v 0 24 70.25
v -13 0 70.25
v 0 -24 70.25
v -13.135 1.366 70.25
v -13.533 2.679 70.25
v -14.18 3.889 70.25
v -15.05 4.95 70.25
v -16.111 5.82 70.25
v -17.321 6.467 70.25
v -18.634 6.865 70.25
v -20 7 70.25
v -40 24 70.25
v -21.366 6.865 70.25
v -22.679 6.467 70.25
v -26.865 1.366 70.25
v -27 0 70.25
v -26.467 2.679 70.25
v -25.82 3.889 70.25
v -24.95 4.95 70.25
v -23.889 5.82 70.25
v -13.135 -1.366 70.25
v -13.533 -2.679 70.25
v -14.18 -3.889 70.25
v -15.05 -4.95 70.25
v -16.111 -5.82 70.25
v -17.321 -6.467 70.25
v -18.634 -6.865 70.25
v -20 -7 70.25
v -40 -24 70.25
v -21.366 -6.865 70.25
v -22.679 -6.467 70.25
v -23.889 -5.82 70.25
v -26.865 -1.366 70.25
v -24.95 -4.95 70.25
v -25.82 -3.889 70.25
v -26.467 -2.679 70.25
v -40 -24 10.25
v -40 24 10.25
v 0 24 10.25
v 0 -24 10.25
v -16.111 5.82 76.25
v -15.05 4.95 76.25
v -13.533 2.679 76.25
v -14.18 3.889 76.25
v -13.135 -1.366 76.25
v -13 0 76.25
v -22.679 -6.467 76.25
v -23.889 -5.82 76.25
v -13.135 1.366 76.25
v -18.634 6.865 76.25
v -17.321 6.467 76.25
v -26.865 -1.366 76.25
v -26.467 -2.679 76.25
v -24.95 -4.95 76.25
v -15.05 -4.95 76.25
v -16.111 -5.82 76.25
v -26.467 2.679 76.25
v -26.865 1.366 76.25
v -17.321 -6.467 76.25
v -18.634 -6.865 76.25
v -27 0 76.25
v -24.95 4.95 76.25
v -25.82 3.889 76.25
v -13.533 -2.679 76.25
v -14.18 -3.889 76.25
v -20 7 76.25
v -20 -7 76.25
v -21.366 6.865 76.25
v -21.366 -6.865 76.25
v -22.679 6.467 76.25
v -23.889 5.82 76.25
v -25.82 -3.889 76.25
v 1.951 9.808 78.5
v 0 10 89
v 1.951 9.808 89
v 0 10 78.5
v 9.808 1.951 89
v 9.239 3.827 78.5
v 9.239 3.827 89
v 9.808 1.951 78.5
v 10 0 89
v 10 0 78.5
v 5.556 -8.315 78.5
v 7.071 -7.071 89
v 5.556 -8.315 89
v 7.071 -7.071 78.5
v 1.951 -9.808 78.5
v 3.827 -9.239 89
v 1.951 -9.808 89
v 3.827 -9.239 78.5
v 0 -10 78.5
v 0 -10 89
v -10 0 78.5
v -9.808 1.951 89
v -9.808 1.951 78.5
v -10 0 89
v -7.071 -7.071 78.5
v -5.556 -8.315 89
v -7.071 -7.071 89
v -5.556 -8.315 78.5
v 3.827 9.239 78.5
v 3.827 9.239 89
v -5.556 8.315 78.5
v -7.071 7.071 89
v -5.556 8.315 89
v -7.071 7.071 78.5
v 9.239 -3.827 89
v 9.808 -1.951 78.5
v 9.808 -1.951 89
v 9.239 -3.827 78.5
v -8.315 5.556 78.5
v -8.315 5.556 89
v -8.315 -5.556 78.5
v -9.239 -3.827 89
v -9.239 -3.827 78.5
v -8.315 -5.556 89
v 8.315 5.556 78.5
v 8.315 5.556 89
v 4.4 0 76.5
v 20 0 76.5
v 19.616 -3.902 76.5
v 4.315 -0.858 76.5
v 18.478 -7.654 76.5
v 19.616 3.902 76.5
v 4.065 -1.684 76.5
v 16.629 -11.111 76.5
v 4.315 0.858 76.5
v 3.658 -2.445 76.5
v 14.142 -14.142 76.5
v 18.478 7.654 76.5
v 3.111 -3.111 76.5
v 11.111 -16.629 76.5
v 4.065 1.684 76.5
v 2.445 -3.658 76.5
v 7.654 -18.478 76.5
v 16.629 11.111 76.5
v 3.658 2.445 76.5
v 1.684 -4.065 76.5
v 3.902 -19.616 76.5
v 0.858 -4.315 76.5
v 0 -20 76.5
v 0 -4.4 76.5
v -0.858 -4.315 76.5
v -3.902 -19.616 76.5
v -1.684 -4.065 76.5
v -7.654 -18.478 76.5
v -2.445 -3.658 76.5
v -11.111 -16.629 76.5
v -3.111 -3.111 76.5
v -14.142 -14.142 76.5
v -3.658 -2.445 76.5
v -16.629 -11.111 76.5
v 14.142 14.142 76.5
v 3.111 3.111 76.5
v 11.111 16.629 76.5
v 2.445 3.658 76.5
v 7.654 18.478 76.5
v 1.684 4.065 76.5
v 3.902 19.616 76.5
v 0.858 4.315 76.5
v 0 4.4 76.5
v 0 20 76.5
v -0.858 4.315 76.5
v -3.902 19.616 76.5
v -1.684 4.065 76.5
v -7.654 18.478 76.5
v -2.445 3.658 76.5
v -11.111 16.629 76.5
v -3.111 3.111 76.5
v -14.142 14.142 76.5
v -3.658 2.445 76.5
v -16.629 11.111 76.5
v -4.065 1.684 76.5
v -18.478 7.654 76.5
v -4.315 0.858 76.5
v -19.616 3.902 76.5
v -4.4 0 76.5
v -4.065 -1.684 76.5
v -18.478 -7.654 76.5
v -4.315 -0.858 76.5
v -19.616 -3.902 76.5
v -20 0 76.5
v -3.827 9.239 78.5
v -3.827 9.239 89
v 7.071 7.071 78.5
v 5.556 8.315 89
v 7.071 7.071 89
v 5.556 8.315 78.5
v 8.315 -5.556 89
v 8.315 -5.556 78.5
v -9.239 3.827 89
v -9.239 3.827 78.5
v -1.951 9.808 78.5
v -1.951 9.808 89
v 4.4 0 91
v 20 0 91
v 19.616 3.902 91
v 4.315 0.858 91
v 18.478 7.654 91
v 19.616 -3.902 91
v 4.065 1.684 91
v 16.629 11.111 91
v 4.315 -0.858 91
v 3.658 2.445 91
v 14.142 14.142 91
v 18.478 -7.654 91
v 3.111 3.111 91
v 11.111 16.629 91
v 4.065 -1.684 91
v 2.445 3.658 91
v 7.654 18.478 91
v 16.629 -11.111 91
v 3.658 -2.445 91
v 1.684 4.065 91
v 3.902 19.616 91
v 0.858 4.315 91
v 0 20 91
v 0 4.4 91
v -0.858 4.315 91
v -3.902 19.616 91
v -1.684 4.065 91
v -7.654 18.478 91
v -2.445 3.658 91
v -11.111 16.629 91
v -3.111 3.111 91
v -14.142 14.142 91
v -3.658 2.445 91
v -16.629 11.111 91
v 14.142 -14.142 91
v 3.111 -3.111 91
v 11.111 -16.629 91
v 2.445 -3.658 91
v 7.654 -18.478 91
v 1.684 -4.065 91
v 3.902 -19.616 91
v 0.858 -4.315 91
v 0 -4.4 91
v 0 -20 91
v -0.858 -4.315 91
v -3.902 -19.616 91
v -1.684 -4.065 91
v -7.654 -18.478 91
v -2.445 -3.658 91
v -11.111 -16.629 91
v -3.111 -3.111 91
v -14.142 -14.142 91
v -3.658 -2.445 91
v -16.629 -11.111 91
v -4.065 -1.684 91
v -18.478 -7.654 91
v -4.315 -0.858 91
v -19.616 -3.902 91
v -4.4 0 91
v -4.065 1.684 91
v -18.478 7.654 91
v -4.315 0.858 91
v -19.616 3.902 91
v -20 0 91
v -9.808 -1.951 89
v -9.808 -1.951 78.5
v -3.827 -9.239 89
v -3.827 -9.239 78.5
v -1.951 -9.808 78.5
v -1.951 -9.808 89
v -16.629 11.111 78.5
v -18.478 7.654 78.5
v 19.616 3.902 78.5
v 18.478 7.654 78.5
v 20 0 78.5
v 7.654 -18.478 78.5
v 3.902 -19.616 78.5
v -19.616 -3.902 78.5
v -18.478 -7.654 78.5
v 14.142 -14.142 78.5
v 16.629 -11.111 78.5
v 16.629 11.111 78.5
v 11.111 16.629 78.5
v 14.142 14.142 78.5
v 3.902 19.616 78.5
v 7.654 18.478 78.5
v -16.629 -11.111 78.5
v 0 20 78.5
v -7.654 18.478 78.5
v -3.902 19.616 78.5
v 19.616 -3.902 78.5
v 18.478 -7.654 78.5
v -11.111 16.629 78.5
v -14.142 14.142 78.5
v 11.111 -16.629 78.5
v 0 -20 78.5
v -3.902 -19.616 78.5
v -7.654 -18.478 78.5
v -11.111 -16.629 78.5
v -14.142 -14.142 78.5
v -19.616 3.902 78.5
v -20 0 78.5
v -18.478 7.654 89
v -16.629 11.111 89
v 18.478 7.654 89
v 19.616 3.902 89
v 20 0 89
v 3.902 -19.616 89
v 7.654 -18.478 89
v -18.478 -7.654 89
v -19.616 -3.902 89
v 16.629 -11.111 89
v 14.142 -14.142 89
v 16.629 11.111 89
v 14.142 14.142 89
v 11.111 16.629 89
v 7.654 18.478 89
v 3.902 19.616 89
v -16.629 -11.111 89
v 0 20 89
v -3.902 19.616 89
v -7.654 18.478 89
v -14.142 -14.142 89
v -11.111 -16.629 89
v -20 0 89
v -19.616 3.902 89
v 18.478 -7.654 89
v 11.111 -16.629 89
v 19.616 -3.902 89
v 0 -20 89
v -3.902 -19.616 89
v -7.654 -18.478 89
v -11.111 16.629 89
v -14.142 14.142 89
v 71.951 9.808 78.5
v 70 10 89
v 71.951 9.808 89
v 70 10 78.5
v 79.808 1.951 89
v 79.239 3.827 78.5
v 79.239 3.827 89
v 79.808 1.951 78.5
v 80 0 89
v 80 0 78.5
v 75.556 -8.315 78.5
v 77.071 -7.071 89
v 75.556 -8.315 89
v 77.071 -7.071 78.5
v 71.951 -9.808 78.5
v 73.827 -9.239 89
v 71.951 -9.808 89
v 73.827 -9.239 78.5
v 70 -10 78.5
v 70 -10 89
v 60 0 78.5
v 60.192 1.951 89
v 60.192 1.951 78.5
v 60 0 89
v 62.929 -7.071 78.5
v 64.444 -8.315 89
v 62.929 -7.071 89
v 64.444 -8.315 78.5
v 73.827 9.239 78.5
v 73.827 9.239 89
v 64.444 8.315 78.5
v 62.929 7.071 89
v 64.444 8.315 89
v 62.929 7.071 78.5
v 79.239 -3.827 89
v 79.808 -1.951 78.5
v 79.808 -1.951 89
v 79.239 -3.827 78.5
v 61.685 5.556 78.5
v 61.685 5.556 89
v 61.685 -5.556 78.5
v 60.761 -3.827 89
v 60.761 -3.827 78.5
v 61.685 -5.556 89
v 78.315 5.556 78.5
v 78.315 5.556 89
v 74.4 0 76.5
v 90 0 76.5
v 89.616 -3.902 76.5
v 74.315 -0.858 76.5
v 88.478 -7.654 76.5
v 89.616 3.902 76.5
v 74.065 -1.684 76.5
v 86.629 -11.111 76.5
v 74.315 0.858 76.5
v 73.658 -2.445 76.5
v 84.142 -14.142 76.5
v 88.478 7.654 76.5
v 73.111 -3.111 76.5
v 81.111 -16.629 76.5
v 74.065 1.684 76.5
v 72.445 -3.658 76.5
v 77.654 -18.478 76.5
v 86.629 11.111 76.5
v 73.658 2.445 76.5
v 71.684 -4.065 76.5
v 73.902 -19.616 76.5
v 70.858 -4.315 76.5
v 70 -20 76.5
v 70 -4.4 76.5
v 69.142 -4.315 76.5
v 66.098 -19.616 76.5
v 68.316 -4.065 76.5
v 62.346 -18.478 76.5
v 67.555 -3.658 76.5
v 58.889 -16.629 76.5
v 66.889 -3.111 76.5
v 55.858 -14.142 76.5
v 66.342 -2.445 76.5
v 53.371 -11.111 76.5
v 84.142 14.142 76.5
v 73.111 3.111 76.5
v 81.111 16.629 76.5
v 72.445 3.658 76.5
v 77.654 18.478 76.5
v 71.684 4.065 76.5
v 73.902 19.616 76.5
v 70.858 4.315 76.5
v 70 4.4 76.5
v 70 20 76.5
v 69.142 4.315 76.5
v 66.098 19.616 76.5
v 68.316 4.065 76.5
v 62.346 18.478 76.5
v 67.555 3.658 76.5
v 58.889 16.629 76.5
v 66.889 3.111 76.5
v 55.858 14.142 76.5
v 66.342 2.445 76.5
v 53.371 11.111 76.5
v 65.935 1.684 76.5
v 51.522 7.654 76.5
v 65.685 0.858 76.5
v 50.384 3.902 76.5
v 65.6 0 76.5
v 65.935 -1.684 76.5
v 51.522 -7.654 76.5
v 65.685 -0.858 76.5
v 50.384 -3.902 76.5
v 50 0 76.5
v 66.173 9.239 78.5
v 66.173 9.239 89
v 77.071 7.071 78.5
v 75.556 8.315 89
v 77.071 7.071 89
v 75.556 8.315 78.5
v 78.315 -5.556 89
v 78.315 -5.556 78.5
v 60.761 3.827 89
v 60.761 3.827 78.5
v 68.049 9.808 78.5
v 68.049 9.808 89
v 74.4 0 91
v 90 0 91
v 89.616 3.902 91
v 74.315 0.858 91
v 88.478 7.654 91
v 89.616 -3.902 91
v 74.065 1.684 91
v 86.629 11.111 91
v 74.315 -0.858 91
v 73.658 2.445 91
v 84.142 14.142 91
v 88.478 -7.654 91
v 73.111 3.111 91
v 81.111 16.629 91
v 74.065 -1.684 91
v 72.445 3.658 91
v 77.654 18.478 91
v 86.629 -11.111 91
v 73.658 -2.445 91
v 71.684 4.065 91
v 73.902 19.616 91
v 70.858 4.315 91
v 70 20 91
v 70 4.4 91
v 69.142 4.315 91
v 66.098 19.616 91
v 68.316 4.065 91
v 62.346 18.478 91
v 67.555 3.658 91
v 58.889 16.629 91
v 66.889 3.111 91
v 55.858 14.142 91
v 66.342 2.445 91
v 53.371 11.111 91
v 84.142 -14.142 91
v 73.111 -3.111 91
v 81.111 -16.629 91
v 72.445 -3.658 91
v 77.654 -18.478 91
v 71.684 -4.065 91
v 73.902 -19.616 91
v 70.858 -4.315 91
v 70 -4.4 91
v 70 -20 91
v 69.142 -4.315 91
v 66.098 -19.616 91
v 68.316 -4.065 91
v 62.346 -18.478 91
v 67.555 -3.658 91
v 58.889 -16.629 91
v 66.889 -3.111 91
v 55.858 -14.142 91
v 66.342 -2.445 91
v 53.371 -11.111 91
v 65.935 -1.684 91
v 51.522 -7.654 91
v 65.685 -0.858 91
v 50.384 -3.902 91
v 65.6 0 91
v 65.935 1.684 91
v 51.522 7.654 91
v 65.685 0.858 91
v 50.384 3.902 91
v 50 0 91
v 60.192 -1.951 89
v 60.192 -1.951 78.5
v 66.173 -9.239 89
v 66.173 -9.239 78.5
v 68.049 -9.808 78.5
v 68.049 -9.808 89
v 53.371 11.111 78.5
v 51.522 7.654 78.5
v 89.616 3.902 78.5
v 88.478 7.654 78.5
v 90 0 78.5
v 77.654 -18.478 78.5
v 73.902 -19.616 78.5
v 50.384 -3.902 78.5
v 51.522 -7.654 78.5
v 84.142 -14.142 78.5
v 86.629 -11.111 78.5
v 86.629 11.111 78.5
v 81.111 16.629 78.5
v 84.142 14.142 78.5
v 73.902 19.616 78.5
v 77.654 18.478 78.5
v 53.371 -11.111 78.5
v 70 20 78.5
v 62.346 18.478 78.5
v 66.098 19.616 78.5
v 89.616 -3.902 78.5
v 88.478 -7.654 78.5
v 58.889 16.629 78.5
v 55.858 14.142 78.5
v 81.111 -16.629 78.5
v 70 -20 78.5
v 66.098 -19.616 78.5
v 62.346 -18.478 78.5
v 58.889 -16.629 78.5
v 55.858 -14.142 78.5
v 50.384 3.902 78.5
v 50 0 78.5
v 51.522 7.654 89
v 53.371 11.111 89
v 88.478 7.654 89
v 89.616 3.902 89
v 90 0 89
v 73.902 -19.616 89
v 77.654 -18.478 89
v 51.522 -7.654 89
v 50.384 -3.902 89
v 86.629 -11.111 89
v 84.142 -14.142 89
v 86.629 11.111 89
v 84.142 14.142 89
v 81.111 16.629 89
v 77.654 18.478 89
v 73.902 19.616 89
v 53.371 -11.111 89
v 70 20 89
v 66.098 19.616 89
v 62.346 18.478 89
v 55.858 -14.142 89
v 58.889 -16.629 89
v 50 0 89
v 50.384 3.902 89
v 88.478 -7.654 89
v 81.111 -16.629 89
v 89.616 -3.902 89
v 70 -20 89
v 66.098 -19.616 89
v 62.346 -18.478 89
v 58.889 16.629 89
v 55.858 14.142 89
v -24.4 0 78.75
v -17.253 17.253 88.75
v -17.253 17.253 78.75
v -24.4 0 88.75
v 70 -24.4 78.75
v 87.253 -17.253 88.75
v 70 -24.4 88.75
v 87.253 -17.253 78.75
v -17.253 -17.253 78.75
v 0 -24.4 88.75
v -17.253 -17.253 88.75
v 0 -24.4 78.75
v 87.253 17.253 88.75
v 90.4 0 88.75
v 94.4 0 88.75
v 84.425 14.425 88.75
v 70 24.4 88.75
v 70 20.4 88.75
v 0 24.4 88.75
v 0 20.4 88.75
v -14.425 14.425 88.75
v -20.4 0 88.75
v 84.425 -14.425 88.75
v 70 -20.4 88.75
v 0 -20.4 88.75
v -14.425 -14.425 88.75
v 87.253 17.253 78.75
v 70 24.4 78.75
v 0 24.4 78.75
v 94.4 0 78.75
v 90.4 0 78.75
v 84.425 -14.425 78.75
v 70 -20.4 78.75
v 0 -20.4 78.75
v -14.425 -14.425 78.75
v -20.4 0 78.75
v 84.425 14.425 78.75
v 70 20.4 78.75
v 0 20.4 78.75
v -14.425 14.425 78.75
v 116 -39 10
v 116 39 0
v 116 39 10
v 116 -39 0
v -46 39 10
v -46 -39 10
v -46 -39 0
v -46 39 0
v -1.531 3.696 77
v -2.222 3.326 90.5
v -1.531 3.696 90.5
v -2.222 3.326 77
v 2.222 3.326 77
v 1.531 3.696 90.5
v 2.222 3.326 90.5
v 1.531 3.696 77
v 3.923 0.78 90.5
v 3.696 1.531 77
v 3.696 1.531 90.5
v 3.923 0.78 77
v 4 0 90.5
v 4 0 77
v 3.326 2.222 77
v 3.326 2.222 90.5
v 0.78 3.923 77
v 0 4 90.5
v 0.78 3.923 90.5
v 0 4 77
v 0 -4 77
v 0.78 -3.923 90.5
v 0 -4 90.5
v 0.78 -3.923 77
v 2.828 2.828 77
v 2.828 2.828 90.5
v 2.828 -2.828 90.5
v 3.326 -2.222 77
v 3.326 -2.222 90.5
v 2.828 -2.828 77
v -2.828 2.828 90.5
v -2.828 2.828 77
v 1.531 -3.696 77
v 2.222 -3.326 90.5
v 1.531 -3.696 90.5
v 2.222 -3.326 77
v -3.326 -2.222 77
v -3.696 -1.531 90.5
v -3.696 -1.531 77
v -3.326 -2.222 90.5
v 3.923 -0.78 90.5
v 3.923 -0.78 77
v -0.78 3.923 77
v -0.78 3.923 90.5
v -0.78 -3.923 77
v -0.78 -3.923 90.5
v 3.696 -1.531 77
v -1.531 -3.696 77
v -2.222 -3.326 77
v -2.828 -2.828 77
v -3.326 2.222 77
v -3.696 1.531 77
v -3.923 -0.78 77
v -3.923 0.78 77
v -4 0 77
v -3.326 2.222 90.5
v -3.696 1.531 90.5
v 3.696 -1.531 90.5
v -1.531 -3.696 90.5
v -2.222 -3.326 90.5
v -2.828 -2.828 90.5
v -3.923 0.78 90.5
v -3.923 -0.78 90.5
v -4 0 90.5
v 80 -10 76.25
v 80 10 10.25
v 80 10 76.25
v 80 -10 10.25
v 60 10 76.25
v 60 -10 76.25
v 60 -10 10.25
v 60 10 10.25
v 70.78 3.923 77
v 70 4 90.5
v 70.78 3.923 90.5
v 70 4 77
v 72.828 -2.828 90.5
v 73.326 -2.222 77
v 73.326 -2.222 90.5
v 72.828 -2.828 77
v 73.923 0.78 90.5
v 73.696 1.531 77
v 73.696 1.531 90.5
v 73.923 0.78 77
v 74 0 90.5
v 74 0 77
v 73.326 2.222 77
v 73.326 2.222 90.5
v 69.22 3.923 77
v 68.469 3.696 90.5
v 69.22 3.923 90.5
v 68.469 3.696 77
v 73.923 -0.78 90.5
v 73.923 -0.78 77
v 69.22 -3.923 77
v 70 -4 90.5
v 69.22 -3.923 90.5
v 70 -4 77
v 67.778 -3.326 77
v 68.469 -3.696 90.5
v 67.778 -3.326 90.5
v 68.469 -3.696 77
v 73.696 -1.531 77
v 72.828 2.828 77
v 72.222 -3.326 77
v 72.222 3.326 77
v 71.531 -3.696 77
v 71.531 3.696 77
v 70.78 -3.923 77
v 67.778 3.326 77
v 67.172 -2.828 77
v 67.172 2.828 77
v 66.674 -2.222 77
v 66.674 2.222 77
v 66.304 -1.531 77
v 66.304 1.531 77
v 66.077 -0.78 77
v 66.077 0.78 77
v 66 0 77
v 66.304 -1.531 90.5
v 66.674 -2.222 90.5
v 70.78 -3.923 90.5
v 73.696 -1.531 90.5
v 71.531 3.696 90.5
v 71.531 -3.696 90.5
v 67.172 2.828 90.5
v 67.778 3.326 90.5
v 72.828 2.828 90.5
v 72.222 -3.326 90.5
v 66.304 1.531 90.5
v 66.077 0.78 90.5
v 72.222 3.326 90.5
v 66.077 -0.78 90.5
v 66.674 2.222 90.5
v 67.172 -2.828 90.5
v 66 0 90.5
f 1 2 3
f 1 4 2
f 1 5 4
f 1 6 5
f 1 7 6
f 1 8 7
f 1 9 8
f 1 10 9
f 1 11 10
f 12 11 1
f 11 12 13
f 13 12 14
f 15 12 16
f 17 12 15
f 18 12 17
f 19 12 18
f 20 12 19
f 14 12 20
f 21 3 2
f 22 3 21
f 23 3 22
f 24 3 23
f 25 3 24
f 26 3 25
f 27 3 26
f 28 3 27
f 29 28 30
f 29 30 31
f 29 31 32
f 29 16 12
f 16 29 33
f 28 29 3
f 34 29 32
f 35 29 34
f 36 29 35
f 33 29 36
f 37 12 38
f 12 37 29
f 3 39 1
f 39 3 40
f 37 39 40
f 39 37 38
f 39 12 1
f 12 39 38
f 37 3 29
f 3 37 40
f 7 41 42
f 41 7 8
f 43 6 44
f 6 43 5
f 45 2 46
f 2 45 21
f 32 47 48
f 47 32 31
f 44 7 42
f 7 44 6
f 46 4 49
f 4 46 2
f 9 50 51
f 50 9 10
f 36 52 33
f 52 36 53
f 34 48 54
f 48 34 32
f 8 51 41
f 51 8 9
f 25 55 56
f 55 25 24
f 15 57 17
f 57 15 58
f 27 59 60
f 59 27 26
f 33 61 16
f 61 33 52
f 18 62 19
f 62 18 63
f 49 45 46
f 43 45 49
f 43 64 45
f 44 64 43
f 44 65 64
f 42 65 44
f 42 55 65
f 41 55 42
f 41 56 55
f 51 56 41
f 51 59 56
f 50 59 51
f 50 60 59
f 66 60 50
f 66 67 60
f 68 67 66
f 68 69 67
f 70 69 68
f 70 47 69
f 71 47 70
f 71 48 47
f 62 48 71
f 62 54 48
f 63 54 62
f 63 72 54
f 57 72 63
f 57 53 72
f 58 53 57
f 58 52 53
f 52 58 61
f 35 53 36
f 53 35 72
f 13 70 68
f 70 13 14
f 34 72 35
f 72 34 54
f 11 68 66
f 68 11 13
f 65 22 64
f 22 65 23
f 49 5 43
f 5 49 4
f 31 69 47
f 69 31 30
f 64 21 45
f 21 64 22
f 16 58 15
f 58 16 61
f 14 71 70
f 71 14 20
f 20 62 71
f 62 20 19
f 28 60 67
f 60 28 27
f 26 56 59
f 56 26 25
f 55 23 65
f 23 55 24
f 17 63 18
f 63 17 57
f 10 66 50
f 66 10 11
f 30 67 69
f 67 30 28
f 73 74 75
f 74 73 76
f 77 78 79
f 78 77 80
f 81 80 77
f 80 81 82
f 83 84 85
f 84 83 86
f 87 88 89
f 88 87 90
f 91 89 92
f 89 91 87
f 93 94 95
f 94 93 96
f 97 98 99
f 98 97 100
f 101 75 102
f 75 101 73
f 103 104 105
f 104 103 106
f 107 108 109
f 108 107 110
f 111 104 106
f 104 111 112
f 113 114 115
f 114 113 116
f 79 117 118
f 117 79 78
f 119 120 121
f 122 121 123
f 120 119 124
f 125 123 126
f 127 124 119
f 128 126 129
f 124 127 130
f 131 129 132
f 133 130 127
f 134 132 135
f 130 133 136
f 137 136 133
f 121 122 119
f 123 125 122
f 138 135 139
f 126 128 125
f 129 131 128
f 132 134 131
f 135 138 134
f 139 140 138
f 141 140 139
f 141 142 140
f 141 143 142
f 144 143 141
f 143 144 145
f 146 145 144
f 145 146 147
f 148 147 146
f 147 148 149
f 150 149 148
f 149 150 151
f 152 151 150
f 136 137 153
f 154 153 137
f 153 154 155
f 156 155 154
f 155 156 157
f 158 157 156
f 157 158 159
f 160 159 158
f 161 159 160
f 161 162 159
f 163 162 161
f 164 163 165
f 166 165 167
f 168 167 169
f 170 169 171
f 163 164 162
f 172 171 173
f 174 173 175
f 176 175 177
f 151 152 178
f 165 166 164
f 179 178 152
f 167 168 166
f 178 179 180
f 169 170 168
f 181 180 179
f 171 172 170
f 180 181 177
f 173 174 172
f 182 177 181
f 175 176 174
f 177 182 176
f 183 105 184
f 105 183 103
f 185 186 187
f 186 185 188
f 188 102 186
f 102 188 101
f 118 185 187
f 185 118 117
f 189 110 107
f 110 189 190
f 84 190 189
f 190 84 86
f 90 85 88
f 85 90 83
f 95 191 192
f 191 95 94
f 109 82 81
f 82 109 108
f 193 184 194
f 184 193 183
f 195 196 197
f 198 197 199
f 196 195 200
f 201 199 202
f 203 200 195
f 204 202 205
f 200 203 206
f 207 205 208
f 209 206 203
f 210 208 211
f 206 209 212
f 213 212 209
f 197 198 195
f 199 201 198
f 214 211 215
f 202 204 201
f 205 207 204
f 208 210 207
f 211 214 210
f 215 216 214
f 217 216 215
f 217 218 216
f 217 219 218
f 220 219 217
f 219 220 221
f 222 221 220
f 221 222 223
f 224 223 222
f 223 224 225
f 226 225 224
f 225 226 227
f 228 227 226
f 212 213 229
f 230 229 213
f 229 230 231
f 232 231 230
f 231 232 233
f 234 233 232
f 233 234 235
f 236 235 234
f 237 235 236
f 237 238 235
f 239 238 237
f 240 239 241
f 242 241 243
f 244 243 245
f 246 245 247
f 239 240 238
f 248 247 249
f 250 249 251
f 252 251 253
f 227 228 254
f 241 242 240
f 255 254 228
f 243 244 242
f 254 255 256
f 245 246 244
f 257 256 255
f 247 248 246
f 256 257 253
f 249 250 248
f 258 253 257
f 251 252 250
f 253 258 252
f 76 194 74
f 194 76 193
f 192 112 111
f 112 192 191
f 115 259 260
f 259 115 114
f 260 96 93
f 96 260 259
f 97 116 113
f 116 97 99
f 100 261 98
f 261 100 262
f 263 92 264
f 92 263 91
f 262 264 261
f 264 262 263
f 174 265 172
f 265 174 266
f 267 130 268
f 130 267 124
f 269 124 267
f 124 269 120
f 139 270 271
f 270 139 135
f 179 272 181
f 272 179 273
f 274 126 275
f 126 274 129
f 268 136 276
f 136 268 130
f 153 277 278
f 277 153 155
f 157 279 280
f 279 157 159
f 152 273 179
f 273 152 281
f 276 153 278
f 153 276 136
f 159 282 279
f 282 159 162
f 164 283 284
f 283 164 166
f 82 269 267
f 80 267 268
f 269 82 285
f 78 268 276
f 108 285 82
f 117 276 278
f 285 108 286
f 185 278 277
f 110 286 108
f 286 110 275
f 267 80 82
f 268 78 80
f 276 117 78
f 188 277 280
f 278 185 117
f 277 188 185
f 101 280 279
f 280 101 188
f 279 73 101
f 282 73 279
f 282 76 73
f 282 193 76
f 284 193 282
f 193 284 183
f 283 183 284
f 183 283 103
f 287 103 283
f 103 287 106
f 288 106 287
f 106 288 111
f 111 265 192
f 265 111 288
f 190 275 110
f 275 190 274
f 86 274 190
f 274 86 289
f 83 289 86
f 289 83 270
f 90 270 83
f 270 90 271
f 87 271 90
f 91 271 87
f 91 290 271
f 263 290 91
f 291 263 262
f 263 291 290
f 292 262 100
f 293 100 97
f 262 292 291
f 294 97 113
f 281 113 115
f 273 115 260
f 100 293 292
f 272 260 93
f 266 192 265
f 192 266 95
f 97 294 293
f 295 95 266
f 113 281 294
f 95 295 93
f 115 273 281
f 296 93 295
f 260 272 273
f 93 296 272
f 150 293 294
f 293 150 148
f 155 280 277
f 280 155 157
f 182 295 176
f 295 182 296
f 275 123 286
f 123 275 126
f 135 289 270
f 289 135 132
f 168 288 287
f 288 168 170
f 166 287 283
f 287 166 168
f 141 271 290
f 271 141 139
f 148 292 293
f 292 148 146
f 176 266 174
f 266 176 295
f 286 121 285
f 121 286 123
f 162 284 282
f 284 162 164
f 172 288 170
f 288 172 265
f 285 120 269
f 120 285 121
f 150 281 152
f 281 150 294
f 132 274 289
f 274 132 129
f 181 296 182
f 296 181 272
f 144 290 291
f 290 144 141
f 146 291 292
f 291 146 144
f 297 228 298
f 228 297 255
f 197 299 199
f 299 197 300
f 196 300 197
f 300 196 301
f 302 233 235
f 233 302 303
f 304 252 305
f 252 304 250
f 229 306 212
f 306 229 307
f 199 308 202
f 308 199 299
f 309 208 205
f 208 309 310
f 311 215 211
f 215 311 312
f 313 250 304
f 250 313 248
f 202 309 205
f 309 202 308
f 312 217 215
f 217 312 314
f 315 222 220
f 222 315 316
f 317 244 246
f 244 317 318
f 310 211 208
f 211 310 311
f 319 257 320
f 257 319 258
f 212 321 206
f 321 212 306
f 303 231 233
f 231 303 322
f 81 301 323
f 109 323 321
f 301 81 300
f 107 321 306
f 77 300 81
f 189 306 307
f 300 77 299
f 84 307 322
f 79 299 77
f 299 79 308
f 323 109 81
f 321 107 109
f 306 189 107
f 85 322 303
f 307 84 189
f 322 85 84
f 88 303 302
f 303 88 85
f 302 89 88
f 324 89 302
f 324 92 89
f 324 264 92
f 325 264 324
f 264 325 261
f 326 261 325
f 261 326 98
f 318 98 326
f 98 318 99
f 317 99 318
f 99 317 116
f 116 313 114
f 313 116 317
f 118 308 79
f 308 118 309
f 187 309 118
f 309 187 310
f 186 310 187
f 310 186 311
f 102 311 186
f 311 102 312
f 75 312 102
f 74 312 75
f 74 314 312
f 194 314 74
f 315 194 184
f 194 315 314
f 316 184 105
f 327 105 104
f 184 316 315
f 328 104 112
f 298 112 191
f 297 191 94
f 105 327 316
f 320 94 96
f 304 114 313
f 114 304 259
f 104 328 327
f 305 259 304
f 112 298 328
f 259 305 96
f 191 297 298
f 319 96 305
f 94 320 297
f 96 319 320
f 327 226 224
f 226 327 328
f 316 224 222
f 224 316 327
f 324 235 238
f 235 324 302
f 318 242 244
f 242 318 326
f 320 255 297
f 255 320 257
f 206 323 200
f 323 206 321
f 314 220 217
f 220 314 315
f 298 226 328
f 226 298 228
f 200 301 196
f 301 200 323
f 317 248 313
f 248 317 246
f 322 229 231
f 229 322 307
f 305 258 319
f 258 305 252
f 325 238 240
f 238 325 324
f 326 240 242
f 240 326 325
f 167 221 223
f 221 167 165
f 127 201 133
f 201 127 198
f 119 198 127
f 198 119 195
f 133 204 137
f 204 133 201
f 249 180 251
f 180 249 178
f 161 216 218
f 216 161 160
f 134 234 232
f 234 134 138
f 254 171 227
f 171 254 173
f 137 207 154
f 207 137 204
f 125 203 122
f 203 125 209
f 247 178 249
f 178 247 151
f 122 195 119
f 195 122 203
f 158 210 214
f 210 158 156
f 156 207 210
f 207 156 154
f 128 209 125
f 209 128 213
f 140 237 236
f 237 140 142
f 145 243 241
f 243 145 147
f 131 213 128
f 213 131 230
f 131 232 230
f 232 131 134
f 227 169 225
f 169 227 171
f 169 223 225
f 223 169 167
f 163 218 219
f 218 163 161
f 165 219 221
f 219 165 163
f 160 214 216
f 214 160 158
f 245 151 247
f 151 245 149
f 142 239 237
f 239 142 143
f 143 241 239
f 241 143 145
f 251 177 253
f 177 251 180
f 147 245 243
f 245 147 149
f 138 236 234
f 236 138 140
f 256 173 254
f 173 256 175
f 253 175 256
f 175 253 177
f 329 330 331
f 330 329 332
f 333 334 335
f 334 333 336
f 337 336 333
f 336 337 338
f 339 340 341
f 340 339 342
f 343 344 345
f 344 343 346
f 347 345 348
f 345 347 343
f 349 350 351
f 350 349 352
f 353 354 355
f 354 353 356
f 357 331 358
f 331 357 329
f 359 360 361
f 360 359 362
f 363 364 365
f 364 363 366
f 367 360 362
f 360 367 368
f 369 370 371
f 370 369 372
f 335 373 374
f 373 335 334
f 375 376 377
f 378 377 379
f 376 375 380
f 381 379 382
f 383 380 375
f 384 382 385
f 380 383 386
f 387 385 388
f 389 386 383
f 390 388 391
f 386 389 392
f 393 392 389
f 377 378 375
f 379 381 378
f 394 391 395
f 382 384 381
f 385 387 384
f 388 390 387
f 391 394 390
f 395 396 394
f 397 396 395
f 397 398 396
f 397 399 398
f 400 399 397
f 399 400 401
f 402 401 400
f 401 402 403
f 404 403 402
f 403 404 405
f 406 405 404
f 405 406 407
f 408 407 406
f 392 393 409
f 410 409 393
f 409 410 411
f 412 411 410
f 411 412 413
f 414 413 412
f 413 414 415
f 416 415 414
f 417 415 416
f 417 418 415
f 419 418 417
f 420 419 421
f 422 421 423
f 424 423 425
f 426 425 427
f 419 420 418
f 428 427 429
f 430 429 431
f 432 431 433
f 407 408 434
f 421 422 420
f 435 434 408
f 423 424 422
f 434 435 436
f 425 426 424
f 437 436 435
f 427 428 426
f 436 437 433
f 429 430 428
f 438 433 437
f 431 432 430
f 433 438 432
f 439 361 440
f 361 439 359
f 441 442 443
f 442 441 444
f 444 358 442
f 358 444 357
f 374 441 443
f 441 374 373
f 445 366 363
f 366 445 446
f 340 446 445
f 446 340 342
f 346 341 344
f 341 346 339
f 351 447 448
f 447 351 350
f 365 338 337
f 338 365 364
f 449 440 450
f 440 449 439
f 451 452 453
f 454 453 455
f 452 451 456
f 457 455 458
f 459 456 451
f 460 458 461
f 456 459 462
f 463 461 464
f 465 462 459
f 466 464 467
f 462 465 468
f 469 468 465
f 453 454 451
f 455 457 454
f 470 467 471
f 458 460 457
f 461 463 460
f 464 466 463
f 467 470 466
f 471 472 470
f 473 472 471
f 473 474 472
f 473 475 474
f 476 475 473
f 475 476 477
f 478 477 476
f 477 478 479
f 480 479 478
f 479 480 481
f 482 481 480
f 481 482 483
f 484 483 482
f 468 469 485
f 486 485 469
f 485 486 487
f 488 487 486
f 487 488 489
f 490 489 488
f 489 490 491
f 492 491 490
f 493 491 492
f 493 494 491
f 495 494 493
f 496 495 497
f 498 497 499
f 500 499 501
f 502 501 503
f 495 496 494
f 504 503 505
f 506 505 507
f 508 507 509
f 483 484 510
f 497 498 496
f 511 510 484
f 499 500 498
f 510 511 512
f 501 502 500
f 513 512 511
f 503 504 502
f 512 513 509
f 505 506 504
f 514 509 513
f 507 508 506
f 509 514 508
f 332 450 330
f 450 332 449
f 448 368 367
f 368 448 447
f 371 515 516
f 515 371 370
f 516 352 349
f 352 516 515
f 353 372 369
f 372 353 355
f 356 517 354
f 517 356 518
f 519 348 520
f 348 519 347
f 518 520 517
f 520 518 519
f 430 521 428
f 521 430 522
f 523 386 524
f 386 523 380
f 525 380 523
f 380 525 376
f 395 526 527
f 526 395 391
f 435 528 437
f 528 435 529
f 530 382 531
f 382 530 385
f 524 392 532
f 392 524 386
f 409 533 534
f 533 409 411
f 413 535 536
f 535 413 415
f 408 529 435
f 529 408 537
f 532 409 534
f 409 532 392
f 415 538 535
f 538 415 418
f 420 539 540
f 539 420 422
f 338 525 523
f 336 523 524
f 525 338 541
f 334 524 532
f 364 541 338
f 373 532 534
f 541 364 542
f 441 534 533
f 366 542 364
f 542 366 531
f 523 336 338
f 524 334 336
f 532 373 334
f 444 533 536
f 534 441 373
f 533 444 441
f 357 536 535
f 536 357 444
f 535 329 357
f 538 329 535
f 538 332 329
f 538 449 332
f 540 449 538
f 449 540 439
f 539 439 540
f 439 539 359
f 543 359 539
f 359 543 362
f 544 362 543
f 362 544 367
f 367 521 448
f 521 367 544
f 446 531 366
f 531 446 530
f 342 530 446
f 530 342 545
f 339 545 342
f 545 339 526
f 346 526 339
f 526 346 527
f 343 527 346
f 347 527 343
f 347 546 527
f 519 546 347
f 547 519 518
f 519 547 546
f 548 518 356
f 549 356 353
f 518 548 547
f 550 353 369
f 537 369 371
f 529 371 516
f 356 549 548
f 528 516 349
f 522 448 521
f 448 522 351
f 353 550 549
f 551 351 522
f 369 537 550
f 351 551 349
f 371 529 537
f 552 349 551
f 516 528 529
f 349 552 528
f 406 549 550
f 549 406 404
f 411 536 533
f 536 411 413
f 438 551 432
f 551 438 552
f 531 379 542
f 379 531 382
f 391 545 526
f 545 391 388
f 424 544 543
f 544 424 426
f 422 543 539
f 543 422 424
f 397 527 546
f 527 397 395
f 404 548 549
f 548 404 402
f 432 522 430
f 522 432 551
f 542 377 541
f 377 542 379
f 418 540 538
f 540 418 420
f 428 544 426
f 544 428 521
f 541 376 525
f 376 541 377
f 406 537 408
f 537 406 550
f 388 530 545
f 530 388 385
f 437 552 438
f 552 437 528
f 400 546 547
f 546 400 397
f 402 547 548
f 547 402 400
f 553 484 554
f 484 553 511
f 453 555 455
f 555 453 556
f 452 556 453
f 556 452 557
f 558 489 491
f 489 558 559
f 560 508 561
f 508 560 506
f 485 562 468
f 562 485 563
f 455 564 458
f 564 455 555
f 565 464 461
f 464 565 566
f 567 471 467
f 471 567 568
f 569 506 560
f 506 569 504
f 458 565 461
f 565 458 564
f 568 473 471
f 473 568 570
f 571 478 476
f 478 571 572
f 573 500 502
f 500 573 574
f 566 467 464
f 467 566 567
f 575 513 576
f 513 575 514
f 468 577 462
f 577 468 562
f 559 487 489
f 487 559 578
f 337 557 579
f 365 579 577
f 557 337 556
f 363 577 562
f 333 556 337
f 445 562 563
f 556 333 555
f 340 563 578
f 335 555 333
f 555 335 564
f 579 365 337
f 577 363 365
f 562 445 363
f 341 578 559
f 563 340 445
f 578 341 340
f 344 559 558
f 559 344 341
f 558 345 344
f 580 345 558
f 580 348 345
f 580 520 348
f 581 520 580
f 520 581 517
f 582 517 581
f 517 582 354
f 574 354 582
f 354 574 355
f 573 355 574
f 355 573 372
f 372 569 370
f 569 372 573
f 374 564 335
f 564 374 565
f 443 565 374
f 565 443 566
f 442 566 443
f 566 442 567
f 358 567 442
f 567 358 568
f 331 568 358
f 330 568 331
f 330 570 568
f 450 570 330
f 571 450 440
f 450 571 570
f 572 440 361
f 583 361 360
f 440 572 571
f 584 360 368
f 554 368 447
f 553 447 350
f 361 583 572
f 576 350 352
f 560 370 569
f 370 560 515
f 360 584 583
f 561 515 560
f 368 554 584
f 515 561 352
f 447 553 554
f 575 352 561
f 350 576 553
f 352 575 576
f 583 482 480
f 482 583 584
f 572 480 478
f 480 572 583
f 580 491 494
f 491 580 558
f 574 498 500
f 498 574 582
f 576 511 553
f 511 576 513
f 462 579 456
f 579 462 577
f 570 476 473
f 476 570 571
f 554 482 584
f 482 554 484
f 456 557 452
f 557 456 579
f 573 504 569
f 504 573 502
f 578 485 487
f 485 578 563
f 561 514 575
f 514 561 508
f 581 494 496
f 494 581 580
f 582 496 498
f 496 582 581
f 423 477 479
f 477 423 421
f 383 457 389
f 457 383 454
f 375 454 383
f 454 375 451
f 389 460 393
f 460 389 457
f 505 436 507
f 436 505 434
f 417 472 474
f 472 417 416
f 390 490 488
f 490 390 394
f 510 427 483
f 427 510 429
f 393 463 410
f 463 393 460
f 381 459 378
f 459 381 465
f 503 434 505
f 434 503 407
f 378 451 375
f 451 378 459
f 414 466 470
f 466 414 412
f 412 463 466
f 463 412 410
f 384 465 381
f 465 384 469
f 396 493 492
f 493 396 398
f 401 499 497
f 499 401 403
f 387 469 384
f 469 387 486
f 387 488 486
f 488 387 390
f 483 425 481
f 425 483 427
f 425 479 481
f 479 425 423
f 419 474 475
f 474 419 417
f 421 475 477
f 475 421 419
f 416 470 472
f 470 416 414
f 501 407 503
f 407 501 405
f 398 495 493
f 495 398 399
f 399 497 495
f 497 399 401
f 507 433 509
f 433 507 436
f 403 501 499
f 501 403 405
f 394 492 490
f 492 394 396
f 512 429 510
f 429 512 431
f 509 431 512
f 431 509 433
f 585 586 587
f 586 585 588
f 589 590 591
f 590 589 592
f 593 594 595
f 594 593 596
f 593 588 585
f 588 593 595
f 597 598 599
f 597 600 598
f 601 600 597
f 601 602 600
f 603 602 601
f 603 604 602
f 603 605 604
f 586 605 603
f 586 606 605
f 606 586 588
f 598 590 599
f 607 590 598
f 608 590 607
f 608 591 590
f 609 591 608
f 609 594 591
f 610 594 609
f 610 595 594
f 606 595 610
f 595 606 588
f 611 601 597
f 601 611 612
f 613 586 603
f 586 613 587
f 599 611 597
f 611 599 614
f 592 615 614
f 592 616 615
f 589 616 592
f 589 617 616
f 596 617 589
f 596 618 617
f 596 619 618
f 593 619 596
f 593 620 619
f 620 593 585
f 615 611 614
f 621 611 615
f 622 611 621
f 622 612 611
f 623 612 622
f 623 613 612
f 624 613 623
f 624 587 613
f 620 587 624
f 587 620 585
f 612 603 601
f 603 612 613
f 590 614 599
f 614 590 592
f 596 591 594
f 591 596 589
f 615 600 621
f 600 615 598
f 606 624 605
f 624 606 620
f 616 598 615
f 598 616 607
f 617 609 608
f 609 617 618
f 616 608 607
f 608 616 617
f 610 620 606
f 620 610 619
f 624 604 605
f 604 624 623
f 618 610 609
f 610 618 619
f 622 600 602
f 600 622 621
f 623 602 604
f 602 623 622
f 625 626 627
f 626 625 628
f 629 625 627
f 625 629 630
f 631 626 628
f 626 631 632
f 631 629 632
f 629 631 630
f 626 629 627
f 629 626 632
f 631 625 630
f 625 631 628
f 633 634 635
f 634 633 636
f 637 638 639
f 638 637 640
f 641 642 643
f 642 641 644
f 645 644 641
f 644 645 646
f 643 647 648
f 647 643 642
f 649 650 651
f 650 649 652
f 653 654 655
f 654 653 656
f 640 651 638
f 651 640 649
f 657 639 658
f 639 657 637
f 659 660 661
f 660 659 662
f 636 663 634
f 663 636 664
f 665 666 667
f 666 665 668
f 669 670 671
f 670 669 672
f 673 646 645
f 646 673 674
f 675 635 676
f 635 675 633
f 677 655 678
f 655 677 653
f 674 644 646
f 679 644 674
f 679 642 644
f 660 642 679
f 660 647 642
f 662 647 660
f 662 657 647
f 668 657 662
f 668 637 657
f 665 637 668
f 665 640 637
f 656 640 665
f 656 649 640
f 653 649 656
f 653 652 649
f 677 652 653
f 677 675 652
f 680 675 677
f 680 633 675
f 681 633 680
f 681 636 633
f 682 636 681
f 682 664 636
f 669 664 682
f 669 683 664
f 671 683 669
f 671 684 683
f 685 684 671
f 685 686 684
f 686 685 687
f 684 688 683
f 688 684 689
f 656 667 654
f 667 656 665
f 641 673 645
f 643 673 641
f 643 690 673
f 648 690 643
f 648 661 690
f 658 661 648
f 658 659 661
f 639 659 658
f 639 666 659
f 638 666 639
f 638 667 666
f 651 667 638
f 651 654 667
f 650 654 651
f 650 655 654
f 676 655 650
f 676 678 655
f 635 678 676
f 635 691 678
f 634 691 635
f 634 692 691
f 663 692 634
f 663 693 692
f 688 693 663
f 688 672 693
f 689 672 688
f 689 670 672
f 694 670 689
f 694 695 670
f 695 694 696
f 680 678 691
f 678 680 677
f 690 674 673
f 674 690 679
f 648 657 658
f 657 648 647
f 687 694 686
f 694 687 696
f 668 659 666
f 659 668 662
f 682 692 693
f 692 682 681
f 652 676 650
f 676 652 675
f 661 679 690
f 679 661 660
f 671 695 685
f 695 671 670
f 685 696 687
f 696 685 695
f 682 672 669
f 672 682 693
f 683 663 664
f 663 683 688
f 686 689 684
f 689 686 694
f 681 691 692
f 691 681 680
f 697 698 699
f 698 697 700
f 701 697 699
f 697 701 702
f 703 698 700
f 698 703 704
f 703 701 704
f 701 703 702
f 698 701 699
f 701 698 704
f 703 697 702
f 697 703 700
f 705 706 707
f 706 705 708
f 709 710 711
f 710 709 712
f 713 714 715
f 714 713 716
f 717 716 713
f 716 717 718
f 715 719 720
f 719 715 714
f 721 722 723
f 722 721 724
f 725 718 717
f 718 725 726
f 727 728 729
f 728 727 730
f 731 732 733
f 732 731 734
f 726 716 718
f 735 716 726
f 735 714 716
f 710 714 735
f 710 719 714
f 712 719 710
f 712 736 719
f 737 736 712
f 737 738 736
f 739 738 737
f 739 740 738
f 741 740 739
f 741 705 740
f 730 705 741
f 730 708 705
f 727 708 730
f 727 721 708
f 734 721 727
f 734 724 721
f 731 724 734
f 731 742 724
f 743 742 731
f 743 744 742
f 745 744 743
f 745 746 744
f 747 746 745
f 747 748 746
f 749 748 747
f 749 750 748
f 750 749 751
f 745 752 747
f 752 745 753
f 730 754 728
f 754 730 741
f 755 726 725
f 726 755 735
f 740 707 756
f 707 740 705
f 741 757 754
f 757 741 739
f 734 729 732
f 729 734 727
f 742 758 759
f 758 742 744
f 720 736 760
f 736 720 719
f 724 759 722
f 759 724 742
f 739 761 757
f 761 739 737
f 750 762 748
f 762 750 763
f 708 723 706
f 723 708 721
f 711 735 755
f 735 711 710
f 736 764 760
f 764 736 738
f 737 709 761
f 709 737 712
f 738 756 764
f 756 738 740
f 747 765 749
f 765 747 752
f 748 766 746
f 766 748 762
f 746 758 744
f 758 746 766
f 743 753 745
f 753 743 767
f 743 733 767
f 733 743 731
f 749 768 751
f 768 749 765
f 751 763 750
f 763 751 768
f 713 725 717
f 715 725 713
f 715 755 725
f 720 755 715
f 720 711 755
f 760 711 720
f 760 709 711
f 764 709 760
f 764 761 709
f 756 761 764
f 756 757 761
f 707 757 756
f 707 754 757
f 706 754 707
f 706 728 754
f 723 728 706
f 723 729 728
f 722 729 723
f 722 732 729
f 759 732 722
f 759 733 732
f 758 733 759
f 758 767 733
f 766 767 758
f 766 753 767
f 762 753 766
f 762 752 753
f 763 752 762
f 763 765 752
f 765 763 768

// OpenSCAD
$fn = 32;

// ------------------------------------------------------------------------
// Motor belt drive: span 70 mm, pulleys d40, belt 10 mm wide
// Every part is its own module, assembly() places every instance.
// ------------------------------------------------------------------------

// --- part 1 ---
module base_plate() {
  difference() {
    translate([-81, -39, 0]) cube([162, 78, 10]);
  }
}

// --- part 2 ---
module motor() {
  union() {
    translate([-30, -24, 0]) cube([60, 48, 40]);
    translate([33, 0, 20]) rotate([0, 90, 0]) cylinder(h = 6, d = 14, center = true);
  }
}

// --- part 3 ---
module drive_shaft() {
  translate([0, 0, -6.75]) cylinder(h = 13.5, d = 8);
}

// --- part 4 ---
module pulley_drive() {
  difference() {
    union() {
      cylinder(h = 14.5, d = 20);
      cylinder(h = 2, d = 40);
      translate([0, 0, 12.5]) cylinder(h = 2, d = 40);
    }
    translate([0, 0, -1]) cylinder(h = 16.5, d = 8.8);
  }
}

// --- part 5 ---
module idler_post() {
  translate([-10, -10, 0]) cube([20, 20, 66]);
}

// --- part 6 ---
module driven_shaft() {
  translate([0, 0, -6.75]) cylinder(h = 13.5, d = 8);
}

// --- part 7 ---
module pulley_driven() {
  difference() {
    union() {
      cylinder(h = 14.5, d = 20);
      cylinder(h = 2, d = 40);
      translate([0, 0, 12.5]) cylinder(h = 2, d = 40);
    }
    translate([0, 0, -1]) cylinder(h = 16.5, d = 8.8);
  }
}

// --- part 8 ---
module drive_belt() {
  difference() {
    linear_extrude(height = 10) polygon(points = concat([for (a = [90 : 45 : 270]) [24.4 * cos(a), 24.4 * sin(a)]], [for (a = [270 : 45 : 450]) [70 + 24.4 * cos(a), 24.4 * sin(a)]]));
    translate([0, 0, -1]) linear_extrude(height = 12) polygon(points = concat([for (a = [90 : 45 : 270]) [20.4 * cos(a), 20.4 * sin(a)]], [for (a = [270 : 45 : 450]) [70 + 20.4 * cos(a), 20.4 * sin(a)]]));
  }
}

// --- assembly ---
module assembly() {
  color([0.80, 0.24, 0.20]) translate([35, 0, 0]) rotate([0, 0, 0]) base_plate();
  color([0.20, 0.45, 0.75]) translate([0, 0, 40.25]) rotate([0, 270, 0]) motor();
  color([0.25, 0.62, 0.32]) translate([0, 0, 83.75]) rotate([0, 0, 0]) drive_shaft();
  color([0.92, 0.70, 0.18]) translate([0, 0, 76.5]) rotate([0, 0, 0]) pulley_drive();
  color([0.58, 0.35, 0.70]) translate([70, 0, 10.25]) rotate([0, 0, 0]) idler_post();
  color([0.16, 0.66, 0.66]) translate([70, 0, 83.75]) rotate([0, 0, 0]) driven_shaft();
  color([0.85, 0.48, 0.18]) translate([70, 0, 76.5]) rotate([0, 0, 0]) pulley_driven();
  color([0.55, 0.60, 0.65]) translate([0, 0, 78.75]) rotate([0, 0, 0]) drive_belt();
}

assembly();
